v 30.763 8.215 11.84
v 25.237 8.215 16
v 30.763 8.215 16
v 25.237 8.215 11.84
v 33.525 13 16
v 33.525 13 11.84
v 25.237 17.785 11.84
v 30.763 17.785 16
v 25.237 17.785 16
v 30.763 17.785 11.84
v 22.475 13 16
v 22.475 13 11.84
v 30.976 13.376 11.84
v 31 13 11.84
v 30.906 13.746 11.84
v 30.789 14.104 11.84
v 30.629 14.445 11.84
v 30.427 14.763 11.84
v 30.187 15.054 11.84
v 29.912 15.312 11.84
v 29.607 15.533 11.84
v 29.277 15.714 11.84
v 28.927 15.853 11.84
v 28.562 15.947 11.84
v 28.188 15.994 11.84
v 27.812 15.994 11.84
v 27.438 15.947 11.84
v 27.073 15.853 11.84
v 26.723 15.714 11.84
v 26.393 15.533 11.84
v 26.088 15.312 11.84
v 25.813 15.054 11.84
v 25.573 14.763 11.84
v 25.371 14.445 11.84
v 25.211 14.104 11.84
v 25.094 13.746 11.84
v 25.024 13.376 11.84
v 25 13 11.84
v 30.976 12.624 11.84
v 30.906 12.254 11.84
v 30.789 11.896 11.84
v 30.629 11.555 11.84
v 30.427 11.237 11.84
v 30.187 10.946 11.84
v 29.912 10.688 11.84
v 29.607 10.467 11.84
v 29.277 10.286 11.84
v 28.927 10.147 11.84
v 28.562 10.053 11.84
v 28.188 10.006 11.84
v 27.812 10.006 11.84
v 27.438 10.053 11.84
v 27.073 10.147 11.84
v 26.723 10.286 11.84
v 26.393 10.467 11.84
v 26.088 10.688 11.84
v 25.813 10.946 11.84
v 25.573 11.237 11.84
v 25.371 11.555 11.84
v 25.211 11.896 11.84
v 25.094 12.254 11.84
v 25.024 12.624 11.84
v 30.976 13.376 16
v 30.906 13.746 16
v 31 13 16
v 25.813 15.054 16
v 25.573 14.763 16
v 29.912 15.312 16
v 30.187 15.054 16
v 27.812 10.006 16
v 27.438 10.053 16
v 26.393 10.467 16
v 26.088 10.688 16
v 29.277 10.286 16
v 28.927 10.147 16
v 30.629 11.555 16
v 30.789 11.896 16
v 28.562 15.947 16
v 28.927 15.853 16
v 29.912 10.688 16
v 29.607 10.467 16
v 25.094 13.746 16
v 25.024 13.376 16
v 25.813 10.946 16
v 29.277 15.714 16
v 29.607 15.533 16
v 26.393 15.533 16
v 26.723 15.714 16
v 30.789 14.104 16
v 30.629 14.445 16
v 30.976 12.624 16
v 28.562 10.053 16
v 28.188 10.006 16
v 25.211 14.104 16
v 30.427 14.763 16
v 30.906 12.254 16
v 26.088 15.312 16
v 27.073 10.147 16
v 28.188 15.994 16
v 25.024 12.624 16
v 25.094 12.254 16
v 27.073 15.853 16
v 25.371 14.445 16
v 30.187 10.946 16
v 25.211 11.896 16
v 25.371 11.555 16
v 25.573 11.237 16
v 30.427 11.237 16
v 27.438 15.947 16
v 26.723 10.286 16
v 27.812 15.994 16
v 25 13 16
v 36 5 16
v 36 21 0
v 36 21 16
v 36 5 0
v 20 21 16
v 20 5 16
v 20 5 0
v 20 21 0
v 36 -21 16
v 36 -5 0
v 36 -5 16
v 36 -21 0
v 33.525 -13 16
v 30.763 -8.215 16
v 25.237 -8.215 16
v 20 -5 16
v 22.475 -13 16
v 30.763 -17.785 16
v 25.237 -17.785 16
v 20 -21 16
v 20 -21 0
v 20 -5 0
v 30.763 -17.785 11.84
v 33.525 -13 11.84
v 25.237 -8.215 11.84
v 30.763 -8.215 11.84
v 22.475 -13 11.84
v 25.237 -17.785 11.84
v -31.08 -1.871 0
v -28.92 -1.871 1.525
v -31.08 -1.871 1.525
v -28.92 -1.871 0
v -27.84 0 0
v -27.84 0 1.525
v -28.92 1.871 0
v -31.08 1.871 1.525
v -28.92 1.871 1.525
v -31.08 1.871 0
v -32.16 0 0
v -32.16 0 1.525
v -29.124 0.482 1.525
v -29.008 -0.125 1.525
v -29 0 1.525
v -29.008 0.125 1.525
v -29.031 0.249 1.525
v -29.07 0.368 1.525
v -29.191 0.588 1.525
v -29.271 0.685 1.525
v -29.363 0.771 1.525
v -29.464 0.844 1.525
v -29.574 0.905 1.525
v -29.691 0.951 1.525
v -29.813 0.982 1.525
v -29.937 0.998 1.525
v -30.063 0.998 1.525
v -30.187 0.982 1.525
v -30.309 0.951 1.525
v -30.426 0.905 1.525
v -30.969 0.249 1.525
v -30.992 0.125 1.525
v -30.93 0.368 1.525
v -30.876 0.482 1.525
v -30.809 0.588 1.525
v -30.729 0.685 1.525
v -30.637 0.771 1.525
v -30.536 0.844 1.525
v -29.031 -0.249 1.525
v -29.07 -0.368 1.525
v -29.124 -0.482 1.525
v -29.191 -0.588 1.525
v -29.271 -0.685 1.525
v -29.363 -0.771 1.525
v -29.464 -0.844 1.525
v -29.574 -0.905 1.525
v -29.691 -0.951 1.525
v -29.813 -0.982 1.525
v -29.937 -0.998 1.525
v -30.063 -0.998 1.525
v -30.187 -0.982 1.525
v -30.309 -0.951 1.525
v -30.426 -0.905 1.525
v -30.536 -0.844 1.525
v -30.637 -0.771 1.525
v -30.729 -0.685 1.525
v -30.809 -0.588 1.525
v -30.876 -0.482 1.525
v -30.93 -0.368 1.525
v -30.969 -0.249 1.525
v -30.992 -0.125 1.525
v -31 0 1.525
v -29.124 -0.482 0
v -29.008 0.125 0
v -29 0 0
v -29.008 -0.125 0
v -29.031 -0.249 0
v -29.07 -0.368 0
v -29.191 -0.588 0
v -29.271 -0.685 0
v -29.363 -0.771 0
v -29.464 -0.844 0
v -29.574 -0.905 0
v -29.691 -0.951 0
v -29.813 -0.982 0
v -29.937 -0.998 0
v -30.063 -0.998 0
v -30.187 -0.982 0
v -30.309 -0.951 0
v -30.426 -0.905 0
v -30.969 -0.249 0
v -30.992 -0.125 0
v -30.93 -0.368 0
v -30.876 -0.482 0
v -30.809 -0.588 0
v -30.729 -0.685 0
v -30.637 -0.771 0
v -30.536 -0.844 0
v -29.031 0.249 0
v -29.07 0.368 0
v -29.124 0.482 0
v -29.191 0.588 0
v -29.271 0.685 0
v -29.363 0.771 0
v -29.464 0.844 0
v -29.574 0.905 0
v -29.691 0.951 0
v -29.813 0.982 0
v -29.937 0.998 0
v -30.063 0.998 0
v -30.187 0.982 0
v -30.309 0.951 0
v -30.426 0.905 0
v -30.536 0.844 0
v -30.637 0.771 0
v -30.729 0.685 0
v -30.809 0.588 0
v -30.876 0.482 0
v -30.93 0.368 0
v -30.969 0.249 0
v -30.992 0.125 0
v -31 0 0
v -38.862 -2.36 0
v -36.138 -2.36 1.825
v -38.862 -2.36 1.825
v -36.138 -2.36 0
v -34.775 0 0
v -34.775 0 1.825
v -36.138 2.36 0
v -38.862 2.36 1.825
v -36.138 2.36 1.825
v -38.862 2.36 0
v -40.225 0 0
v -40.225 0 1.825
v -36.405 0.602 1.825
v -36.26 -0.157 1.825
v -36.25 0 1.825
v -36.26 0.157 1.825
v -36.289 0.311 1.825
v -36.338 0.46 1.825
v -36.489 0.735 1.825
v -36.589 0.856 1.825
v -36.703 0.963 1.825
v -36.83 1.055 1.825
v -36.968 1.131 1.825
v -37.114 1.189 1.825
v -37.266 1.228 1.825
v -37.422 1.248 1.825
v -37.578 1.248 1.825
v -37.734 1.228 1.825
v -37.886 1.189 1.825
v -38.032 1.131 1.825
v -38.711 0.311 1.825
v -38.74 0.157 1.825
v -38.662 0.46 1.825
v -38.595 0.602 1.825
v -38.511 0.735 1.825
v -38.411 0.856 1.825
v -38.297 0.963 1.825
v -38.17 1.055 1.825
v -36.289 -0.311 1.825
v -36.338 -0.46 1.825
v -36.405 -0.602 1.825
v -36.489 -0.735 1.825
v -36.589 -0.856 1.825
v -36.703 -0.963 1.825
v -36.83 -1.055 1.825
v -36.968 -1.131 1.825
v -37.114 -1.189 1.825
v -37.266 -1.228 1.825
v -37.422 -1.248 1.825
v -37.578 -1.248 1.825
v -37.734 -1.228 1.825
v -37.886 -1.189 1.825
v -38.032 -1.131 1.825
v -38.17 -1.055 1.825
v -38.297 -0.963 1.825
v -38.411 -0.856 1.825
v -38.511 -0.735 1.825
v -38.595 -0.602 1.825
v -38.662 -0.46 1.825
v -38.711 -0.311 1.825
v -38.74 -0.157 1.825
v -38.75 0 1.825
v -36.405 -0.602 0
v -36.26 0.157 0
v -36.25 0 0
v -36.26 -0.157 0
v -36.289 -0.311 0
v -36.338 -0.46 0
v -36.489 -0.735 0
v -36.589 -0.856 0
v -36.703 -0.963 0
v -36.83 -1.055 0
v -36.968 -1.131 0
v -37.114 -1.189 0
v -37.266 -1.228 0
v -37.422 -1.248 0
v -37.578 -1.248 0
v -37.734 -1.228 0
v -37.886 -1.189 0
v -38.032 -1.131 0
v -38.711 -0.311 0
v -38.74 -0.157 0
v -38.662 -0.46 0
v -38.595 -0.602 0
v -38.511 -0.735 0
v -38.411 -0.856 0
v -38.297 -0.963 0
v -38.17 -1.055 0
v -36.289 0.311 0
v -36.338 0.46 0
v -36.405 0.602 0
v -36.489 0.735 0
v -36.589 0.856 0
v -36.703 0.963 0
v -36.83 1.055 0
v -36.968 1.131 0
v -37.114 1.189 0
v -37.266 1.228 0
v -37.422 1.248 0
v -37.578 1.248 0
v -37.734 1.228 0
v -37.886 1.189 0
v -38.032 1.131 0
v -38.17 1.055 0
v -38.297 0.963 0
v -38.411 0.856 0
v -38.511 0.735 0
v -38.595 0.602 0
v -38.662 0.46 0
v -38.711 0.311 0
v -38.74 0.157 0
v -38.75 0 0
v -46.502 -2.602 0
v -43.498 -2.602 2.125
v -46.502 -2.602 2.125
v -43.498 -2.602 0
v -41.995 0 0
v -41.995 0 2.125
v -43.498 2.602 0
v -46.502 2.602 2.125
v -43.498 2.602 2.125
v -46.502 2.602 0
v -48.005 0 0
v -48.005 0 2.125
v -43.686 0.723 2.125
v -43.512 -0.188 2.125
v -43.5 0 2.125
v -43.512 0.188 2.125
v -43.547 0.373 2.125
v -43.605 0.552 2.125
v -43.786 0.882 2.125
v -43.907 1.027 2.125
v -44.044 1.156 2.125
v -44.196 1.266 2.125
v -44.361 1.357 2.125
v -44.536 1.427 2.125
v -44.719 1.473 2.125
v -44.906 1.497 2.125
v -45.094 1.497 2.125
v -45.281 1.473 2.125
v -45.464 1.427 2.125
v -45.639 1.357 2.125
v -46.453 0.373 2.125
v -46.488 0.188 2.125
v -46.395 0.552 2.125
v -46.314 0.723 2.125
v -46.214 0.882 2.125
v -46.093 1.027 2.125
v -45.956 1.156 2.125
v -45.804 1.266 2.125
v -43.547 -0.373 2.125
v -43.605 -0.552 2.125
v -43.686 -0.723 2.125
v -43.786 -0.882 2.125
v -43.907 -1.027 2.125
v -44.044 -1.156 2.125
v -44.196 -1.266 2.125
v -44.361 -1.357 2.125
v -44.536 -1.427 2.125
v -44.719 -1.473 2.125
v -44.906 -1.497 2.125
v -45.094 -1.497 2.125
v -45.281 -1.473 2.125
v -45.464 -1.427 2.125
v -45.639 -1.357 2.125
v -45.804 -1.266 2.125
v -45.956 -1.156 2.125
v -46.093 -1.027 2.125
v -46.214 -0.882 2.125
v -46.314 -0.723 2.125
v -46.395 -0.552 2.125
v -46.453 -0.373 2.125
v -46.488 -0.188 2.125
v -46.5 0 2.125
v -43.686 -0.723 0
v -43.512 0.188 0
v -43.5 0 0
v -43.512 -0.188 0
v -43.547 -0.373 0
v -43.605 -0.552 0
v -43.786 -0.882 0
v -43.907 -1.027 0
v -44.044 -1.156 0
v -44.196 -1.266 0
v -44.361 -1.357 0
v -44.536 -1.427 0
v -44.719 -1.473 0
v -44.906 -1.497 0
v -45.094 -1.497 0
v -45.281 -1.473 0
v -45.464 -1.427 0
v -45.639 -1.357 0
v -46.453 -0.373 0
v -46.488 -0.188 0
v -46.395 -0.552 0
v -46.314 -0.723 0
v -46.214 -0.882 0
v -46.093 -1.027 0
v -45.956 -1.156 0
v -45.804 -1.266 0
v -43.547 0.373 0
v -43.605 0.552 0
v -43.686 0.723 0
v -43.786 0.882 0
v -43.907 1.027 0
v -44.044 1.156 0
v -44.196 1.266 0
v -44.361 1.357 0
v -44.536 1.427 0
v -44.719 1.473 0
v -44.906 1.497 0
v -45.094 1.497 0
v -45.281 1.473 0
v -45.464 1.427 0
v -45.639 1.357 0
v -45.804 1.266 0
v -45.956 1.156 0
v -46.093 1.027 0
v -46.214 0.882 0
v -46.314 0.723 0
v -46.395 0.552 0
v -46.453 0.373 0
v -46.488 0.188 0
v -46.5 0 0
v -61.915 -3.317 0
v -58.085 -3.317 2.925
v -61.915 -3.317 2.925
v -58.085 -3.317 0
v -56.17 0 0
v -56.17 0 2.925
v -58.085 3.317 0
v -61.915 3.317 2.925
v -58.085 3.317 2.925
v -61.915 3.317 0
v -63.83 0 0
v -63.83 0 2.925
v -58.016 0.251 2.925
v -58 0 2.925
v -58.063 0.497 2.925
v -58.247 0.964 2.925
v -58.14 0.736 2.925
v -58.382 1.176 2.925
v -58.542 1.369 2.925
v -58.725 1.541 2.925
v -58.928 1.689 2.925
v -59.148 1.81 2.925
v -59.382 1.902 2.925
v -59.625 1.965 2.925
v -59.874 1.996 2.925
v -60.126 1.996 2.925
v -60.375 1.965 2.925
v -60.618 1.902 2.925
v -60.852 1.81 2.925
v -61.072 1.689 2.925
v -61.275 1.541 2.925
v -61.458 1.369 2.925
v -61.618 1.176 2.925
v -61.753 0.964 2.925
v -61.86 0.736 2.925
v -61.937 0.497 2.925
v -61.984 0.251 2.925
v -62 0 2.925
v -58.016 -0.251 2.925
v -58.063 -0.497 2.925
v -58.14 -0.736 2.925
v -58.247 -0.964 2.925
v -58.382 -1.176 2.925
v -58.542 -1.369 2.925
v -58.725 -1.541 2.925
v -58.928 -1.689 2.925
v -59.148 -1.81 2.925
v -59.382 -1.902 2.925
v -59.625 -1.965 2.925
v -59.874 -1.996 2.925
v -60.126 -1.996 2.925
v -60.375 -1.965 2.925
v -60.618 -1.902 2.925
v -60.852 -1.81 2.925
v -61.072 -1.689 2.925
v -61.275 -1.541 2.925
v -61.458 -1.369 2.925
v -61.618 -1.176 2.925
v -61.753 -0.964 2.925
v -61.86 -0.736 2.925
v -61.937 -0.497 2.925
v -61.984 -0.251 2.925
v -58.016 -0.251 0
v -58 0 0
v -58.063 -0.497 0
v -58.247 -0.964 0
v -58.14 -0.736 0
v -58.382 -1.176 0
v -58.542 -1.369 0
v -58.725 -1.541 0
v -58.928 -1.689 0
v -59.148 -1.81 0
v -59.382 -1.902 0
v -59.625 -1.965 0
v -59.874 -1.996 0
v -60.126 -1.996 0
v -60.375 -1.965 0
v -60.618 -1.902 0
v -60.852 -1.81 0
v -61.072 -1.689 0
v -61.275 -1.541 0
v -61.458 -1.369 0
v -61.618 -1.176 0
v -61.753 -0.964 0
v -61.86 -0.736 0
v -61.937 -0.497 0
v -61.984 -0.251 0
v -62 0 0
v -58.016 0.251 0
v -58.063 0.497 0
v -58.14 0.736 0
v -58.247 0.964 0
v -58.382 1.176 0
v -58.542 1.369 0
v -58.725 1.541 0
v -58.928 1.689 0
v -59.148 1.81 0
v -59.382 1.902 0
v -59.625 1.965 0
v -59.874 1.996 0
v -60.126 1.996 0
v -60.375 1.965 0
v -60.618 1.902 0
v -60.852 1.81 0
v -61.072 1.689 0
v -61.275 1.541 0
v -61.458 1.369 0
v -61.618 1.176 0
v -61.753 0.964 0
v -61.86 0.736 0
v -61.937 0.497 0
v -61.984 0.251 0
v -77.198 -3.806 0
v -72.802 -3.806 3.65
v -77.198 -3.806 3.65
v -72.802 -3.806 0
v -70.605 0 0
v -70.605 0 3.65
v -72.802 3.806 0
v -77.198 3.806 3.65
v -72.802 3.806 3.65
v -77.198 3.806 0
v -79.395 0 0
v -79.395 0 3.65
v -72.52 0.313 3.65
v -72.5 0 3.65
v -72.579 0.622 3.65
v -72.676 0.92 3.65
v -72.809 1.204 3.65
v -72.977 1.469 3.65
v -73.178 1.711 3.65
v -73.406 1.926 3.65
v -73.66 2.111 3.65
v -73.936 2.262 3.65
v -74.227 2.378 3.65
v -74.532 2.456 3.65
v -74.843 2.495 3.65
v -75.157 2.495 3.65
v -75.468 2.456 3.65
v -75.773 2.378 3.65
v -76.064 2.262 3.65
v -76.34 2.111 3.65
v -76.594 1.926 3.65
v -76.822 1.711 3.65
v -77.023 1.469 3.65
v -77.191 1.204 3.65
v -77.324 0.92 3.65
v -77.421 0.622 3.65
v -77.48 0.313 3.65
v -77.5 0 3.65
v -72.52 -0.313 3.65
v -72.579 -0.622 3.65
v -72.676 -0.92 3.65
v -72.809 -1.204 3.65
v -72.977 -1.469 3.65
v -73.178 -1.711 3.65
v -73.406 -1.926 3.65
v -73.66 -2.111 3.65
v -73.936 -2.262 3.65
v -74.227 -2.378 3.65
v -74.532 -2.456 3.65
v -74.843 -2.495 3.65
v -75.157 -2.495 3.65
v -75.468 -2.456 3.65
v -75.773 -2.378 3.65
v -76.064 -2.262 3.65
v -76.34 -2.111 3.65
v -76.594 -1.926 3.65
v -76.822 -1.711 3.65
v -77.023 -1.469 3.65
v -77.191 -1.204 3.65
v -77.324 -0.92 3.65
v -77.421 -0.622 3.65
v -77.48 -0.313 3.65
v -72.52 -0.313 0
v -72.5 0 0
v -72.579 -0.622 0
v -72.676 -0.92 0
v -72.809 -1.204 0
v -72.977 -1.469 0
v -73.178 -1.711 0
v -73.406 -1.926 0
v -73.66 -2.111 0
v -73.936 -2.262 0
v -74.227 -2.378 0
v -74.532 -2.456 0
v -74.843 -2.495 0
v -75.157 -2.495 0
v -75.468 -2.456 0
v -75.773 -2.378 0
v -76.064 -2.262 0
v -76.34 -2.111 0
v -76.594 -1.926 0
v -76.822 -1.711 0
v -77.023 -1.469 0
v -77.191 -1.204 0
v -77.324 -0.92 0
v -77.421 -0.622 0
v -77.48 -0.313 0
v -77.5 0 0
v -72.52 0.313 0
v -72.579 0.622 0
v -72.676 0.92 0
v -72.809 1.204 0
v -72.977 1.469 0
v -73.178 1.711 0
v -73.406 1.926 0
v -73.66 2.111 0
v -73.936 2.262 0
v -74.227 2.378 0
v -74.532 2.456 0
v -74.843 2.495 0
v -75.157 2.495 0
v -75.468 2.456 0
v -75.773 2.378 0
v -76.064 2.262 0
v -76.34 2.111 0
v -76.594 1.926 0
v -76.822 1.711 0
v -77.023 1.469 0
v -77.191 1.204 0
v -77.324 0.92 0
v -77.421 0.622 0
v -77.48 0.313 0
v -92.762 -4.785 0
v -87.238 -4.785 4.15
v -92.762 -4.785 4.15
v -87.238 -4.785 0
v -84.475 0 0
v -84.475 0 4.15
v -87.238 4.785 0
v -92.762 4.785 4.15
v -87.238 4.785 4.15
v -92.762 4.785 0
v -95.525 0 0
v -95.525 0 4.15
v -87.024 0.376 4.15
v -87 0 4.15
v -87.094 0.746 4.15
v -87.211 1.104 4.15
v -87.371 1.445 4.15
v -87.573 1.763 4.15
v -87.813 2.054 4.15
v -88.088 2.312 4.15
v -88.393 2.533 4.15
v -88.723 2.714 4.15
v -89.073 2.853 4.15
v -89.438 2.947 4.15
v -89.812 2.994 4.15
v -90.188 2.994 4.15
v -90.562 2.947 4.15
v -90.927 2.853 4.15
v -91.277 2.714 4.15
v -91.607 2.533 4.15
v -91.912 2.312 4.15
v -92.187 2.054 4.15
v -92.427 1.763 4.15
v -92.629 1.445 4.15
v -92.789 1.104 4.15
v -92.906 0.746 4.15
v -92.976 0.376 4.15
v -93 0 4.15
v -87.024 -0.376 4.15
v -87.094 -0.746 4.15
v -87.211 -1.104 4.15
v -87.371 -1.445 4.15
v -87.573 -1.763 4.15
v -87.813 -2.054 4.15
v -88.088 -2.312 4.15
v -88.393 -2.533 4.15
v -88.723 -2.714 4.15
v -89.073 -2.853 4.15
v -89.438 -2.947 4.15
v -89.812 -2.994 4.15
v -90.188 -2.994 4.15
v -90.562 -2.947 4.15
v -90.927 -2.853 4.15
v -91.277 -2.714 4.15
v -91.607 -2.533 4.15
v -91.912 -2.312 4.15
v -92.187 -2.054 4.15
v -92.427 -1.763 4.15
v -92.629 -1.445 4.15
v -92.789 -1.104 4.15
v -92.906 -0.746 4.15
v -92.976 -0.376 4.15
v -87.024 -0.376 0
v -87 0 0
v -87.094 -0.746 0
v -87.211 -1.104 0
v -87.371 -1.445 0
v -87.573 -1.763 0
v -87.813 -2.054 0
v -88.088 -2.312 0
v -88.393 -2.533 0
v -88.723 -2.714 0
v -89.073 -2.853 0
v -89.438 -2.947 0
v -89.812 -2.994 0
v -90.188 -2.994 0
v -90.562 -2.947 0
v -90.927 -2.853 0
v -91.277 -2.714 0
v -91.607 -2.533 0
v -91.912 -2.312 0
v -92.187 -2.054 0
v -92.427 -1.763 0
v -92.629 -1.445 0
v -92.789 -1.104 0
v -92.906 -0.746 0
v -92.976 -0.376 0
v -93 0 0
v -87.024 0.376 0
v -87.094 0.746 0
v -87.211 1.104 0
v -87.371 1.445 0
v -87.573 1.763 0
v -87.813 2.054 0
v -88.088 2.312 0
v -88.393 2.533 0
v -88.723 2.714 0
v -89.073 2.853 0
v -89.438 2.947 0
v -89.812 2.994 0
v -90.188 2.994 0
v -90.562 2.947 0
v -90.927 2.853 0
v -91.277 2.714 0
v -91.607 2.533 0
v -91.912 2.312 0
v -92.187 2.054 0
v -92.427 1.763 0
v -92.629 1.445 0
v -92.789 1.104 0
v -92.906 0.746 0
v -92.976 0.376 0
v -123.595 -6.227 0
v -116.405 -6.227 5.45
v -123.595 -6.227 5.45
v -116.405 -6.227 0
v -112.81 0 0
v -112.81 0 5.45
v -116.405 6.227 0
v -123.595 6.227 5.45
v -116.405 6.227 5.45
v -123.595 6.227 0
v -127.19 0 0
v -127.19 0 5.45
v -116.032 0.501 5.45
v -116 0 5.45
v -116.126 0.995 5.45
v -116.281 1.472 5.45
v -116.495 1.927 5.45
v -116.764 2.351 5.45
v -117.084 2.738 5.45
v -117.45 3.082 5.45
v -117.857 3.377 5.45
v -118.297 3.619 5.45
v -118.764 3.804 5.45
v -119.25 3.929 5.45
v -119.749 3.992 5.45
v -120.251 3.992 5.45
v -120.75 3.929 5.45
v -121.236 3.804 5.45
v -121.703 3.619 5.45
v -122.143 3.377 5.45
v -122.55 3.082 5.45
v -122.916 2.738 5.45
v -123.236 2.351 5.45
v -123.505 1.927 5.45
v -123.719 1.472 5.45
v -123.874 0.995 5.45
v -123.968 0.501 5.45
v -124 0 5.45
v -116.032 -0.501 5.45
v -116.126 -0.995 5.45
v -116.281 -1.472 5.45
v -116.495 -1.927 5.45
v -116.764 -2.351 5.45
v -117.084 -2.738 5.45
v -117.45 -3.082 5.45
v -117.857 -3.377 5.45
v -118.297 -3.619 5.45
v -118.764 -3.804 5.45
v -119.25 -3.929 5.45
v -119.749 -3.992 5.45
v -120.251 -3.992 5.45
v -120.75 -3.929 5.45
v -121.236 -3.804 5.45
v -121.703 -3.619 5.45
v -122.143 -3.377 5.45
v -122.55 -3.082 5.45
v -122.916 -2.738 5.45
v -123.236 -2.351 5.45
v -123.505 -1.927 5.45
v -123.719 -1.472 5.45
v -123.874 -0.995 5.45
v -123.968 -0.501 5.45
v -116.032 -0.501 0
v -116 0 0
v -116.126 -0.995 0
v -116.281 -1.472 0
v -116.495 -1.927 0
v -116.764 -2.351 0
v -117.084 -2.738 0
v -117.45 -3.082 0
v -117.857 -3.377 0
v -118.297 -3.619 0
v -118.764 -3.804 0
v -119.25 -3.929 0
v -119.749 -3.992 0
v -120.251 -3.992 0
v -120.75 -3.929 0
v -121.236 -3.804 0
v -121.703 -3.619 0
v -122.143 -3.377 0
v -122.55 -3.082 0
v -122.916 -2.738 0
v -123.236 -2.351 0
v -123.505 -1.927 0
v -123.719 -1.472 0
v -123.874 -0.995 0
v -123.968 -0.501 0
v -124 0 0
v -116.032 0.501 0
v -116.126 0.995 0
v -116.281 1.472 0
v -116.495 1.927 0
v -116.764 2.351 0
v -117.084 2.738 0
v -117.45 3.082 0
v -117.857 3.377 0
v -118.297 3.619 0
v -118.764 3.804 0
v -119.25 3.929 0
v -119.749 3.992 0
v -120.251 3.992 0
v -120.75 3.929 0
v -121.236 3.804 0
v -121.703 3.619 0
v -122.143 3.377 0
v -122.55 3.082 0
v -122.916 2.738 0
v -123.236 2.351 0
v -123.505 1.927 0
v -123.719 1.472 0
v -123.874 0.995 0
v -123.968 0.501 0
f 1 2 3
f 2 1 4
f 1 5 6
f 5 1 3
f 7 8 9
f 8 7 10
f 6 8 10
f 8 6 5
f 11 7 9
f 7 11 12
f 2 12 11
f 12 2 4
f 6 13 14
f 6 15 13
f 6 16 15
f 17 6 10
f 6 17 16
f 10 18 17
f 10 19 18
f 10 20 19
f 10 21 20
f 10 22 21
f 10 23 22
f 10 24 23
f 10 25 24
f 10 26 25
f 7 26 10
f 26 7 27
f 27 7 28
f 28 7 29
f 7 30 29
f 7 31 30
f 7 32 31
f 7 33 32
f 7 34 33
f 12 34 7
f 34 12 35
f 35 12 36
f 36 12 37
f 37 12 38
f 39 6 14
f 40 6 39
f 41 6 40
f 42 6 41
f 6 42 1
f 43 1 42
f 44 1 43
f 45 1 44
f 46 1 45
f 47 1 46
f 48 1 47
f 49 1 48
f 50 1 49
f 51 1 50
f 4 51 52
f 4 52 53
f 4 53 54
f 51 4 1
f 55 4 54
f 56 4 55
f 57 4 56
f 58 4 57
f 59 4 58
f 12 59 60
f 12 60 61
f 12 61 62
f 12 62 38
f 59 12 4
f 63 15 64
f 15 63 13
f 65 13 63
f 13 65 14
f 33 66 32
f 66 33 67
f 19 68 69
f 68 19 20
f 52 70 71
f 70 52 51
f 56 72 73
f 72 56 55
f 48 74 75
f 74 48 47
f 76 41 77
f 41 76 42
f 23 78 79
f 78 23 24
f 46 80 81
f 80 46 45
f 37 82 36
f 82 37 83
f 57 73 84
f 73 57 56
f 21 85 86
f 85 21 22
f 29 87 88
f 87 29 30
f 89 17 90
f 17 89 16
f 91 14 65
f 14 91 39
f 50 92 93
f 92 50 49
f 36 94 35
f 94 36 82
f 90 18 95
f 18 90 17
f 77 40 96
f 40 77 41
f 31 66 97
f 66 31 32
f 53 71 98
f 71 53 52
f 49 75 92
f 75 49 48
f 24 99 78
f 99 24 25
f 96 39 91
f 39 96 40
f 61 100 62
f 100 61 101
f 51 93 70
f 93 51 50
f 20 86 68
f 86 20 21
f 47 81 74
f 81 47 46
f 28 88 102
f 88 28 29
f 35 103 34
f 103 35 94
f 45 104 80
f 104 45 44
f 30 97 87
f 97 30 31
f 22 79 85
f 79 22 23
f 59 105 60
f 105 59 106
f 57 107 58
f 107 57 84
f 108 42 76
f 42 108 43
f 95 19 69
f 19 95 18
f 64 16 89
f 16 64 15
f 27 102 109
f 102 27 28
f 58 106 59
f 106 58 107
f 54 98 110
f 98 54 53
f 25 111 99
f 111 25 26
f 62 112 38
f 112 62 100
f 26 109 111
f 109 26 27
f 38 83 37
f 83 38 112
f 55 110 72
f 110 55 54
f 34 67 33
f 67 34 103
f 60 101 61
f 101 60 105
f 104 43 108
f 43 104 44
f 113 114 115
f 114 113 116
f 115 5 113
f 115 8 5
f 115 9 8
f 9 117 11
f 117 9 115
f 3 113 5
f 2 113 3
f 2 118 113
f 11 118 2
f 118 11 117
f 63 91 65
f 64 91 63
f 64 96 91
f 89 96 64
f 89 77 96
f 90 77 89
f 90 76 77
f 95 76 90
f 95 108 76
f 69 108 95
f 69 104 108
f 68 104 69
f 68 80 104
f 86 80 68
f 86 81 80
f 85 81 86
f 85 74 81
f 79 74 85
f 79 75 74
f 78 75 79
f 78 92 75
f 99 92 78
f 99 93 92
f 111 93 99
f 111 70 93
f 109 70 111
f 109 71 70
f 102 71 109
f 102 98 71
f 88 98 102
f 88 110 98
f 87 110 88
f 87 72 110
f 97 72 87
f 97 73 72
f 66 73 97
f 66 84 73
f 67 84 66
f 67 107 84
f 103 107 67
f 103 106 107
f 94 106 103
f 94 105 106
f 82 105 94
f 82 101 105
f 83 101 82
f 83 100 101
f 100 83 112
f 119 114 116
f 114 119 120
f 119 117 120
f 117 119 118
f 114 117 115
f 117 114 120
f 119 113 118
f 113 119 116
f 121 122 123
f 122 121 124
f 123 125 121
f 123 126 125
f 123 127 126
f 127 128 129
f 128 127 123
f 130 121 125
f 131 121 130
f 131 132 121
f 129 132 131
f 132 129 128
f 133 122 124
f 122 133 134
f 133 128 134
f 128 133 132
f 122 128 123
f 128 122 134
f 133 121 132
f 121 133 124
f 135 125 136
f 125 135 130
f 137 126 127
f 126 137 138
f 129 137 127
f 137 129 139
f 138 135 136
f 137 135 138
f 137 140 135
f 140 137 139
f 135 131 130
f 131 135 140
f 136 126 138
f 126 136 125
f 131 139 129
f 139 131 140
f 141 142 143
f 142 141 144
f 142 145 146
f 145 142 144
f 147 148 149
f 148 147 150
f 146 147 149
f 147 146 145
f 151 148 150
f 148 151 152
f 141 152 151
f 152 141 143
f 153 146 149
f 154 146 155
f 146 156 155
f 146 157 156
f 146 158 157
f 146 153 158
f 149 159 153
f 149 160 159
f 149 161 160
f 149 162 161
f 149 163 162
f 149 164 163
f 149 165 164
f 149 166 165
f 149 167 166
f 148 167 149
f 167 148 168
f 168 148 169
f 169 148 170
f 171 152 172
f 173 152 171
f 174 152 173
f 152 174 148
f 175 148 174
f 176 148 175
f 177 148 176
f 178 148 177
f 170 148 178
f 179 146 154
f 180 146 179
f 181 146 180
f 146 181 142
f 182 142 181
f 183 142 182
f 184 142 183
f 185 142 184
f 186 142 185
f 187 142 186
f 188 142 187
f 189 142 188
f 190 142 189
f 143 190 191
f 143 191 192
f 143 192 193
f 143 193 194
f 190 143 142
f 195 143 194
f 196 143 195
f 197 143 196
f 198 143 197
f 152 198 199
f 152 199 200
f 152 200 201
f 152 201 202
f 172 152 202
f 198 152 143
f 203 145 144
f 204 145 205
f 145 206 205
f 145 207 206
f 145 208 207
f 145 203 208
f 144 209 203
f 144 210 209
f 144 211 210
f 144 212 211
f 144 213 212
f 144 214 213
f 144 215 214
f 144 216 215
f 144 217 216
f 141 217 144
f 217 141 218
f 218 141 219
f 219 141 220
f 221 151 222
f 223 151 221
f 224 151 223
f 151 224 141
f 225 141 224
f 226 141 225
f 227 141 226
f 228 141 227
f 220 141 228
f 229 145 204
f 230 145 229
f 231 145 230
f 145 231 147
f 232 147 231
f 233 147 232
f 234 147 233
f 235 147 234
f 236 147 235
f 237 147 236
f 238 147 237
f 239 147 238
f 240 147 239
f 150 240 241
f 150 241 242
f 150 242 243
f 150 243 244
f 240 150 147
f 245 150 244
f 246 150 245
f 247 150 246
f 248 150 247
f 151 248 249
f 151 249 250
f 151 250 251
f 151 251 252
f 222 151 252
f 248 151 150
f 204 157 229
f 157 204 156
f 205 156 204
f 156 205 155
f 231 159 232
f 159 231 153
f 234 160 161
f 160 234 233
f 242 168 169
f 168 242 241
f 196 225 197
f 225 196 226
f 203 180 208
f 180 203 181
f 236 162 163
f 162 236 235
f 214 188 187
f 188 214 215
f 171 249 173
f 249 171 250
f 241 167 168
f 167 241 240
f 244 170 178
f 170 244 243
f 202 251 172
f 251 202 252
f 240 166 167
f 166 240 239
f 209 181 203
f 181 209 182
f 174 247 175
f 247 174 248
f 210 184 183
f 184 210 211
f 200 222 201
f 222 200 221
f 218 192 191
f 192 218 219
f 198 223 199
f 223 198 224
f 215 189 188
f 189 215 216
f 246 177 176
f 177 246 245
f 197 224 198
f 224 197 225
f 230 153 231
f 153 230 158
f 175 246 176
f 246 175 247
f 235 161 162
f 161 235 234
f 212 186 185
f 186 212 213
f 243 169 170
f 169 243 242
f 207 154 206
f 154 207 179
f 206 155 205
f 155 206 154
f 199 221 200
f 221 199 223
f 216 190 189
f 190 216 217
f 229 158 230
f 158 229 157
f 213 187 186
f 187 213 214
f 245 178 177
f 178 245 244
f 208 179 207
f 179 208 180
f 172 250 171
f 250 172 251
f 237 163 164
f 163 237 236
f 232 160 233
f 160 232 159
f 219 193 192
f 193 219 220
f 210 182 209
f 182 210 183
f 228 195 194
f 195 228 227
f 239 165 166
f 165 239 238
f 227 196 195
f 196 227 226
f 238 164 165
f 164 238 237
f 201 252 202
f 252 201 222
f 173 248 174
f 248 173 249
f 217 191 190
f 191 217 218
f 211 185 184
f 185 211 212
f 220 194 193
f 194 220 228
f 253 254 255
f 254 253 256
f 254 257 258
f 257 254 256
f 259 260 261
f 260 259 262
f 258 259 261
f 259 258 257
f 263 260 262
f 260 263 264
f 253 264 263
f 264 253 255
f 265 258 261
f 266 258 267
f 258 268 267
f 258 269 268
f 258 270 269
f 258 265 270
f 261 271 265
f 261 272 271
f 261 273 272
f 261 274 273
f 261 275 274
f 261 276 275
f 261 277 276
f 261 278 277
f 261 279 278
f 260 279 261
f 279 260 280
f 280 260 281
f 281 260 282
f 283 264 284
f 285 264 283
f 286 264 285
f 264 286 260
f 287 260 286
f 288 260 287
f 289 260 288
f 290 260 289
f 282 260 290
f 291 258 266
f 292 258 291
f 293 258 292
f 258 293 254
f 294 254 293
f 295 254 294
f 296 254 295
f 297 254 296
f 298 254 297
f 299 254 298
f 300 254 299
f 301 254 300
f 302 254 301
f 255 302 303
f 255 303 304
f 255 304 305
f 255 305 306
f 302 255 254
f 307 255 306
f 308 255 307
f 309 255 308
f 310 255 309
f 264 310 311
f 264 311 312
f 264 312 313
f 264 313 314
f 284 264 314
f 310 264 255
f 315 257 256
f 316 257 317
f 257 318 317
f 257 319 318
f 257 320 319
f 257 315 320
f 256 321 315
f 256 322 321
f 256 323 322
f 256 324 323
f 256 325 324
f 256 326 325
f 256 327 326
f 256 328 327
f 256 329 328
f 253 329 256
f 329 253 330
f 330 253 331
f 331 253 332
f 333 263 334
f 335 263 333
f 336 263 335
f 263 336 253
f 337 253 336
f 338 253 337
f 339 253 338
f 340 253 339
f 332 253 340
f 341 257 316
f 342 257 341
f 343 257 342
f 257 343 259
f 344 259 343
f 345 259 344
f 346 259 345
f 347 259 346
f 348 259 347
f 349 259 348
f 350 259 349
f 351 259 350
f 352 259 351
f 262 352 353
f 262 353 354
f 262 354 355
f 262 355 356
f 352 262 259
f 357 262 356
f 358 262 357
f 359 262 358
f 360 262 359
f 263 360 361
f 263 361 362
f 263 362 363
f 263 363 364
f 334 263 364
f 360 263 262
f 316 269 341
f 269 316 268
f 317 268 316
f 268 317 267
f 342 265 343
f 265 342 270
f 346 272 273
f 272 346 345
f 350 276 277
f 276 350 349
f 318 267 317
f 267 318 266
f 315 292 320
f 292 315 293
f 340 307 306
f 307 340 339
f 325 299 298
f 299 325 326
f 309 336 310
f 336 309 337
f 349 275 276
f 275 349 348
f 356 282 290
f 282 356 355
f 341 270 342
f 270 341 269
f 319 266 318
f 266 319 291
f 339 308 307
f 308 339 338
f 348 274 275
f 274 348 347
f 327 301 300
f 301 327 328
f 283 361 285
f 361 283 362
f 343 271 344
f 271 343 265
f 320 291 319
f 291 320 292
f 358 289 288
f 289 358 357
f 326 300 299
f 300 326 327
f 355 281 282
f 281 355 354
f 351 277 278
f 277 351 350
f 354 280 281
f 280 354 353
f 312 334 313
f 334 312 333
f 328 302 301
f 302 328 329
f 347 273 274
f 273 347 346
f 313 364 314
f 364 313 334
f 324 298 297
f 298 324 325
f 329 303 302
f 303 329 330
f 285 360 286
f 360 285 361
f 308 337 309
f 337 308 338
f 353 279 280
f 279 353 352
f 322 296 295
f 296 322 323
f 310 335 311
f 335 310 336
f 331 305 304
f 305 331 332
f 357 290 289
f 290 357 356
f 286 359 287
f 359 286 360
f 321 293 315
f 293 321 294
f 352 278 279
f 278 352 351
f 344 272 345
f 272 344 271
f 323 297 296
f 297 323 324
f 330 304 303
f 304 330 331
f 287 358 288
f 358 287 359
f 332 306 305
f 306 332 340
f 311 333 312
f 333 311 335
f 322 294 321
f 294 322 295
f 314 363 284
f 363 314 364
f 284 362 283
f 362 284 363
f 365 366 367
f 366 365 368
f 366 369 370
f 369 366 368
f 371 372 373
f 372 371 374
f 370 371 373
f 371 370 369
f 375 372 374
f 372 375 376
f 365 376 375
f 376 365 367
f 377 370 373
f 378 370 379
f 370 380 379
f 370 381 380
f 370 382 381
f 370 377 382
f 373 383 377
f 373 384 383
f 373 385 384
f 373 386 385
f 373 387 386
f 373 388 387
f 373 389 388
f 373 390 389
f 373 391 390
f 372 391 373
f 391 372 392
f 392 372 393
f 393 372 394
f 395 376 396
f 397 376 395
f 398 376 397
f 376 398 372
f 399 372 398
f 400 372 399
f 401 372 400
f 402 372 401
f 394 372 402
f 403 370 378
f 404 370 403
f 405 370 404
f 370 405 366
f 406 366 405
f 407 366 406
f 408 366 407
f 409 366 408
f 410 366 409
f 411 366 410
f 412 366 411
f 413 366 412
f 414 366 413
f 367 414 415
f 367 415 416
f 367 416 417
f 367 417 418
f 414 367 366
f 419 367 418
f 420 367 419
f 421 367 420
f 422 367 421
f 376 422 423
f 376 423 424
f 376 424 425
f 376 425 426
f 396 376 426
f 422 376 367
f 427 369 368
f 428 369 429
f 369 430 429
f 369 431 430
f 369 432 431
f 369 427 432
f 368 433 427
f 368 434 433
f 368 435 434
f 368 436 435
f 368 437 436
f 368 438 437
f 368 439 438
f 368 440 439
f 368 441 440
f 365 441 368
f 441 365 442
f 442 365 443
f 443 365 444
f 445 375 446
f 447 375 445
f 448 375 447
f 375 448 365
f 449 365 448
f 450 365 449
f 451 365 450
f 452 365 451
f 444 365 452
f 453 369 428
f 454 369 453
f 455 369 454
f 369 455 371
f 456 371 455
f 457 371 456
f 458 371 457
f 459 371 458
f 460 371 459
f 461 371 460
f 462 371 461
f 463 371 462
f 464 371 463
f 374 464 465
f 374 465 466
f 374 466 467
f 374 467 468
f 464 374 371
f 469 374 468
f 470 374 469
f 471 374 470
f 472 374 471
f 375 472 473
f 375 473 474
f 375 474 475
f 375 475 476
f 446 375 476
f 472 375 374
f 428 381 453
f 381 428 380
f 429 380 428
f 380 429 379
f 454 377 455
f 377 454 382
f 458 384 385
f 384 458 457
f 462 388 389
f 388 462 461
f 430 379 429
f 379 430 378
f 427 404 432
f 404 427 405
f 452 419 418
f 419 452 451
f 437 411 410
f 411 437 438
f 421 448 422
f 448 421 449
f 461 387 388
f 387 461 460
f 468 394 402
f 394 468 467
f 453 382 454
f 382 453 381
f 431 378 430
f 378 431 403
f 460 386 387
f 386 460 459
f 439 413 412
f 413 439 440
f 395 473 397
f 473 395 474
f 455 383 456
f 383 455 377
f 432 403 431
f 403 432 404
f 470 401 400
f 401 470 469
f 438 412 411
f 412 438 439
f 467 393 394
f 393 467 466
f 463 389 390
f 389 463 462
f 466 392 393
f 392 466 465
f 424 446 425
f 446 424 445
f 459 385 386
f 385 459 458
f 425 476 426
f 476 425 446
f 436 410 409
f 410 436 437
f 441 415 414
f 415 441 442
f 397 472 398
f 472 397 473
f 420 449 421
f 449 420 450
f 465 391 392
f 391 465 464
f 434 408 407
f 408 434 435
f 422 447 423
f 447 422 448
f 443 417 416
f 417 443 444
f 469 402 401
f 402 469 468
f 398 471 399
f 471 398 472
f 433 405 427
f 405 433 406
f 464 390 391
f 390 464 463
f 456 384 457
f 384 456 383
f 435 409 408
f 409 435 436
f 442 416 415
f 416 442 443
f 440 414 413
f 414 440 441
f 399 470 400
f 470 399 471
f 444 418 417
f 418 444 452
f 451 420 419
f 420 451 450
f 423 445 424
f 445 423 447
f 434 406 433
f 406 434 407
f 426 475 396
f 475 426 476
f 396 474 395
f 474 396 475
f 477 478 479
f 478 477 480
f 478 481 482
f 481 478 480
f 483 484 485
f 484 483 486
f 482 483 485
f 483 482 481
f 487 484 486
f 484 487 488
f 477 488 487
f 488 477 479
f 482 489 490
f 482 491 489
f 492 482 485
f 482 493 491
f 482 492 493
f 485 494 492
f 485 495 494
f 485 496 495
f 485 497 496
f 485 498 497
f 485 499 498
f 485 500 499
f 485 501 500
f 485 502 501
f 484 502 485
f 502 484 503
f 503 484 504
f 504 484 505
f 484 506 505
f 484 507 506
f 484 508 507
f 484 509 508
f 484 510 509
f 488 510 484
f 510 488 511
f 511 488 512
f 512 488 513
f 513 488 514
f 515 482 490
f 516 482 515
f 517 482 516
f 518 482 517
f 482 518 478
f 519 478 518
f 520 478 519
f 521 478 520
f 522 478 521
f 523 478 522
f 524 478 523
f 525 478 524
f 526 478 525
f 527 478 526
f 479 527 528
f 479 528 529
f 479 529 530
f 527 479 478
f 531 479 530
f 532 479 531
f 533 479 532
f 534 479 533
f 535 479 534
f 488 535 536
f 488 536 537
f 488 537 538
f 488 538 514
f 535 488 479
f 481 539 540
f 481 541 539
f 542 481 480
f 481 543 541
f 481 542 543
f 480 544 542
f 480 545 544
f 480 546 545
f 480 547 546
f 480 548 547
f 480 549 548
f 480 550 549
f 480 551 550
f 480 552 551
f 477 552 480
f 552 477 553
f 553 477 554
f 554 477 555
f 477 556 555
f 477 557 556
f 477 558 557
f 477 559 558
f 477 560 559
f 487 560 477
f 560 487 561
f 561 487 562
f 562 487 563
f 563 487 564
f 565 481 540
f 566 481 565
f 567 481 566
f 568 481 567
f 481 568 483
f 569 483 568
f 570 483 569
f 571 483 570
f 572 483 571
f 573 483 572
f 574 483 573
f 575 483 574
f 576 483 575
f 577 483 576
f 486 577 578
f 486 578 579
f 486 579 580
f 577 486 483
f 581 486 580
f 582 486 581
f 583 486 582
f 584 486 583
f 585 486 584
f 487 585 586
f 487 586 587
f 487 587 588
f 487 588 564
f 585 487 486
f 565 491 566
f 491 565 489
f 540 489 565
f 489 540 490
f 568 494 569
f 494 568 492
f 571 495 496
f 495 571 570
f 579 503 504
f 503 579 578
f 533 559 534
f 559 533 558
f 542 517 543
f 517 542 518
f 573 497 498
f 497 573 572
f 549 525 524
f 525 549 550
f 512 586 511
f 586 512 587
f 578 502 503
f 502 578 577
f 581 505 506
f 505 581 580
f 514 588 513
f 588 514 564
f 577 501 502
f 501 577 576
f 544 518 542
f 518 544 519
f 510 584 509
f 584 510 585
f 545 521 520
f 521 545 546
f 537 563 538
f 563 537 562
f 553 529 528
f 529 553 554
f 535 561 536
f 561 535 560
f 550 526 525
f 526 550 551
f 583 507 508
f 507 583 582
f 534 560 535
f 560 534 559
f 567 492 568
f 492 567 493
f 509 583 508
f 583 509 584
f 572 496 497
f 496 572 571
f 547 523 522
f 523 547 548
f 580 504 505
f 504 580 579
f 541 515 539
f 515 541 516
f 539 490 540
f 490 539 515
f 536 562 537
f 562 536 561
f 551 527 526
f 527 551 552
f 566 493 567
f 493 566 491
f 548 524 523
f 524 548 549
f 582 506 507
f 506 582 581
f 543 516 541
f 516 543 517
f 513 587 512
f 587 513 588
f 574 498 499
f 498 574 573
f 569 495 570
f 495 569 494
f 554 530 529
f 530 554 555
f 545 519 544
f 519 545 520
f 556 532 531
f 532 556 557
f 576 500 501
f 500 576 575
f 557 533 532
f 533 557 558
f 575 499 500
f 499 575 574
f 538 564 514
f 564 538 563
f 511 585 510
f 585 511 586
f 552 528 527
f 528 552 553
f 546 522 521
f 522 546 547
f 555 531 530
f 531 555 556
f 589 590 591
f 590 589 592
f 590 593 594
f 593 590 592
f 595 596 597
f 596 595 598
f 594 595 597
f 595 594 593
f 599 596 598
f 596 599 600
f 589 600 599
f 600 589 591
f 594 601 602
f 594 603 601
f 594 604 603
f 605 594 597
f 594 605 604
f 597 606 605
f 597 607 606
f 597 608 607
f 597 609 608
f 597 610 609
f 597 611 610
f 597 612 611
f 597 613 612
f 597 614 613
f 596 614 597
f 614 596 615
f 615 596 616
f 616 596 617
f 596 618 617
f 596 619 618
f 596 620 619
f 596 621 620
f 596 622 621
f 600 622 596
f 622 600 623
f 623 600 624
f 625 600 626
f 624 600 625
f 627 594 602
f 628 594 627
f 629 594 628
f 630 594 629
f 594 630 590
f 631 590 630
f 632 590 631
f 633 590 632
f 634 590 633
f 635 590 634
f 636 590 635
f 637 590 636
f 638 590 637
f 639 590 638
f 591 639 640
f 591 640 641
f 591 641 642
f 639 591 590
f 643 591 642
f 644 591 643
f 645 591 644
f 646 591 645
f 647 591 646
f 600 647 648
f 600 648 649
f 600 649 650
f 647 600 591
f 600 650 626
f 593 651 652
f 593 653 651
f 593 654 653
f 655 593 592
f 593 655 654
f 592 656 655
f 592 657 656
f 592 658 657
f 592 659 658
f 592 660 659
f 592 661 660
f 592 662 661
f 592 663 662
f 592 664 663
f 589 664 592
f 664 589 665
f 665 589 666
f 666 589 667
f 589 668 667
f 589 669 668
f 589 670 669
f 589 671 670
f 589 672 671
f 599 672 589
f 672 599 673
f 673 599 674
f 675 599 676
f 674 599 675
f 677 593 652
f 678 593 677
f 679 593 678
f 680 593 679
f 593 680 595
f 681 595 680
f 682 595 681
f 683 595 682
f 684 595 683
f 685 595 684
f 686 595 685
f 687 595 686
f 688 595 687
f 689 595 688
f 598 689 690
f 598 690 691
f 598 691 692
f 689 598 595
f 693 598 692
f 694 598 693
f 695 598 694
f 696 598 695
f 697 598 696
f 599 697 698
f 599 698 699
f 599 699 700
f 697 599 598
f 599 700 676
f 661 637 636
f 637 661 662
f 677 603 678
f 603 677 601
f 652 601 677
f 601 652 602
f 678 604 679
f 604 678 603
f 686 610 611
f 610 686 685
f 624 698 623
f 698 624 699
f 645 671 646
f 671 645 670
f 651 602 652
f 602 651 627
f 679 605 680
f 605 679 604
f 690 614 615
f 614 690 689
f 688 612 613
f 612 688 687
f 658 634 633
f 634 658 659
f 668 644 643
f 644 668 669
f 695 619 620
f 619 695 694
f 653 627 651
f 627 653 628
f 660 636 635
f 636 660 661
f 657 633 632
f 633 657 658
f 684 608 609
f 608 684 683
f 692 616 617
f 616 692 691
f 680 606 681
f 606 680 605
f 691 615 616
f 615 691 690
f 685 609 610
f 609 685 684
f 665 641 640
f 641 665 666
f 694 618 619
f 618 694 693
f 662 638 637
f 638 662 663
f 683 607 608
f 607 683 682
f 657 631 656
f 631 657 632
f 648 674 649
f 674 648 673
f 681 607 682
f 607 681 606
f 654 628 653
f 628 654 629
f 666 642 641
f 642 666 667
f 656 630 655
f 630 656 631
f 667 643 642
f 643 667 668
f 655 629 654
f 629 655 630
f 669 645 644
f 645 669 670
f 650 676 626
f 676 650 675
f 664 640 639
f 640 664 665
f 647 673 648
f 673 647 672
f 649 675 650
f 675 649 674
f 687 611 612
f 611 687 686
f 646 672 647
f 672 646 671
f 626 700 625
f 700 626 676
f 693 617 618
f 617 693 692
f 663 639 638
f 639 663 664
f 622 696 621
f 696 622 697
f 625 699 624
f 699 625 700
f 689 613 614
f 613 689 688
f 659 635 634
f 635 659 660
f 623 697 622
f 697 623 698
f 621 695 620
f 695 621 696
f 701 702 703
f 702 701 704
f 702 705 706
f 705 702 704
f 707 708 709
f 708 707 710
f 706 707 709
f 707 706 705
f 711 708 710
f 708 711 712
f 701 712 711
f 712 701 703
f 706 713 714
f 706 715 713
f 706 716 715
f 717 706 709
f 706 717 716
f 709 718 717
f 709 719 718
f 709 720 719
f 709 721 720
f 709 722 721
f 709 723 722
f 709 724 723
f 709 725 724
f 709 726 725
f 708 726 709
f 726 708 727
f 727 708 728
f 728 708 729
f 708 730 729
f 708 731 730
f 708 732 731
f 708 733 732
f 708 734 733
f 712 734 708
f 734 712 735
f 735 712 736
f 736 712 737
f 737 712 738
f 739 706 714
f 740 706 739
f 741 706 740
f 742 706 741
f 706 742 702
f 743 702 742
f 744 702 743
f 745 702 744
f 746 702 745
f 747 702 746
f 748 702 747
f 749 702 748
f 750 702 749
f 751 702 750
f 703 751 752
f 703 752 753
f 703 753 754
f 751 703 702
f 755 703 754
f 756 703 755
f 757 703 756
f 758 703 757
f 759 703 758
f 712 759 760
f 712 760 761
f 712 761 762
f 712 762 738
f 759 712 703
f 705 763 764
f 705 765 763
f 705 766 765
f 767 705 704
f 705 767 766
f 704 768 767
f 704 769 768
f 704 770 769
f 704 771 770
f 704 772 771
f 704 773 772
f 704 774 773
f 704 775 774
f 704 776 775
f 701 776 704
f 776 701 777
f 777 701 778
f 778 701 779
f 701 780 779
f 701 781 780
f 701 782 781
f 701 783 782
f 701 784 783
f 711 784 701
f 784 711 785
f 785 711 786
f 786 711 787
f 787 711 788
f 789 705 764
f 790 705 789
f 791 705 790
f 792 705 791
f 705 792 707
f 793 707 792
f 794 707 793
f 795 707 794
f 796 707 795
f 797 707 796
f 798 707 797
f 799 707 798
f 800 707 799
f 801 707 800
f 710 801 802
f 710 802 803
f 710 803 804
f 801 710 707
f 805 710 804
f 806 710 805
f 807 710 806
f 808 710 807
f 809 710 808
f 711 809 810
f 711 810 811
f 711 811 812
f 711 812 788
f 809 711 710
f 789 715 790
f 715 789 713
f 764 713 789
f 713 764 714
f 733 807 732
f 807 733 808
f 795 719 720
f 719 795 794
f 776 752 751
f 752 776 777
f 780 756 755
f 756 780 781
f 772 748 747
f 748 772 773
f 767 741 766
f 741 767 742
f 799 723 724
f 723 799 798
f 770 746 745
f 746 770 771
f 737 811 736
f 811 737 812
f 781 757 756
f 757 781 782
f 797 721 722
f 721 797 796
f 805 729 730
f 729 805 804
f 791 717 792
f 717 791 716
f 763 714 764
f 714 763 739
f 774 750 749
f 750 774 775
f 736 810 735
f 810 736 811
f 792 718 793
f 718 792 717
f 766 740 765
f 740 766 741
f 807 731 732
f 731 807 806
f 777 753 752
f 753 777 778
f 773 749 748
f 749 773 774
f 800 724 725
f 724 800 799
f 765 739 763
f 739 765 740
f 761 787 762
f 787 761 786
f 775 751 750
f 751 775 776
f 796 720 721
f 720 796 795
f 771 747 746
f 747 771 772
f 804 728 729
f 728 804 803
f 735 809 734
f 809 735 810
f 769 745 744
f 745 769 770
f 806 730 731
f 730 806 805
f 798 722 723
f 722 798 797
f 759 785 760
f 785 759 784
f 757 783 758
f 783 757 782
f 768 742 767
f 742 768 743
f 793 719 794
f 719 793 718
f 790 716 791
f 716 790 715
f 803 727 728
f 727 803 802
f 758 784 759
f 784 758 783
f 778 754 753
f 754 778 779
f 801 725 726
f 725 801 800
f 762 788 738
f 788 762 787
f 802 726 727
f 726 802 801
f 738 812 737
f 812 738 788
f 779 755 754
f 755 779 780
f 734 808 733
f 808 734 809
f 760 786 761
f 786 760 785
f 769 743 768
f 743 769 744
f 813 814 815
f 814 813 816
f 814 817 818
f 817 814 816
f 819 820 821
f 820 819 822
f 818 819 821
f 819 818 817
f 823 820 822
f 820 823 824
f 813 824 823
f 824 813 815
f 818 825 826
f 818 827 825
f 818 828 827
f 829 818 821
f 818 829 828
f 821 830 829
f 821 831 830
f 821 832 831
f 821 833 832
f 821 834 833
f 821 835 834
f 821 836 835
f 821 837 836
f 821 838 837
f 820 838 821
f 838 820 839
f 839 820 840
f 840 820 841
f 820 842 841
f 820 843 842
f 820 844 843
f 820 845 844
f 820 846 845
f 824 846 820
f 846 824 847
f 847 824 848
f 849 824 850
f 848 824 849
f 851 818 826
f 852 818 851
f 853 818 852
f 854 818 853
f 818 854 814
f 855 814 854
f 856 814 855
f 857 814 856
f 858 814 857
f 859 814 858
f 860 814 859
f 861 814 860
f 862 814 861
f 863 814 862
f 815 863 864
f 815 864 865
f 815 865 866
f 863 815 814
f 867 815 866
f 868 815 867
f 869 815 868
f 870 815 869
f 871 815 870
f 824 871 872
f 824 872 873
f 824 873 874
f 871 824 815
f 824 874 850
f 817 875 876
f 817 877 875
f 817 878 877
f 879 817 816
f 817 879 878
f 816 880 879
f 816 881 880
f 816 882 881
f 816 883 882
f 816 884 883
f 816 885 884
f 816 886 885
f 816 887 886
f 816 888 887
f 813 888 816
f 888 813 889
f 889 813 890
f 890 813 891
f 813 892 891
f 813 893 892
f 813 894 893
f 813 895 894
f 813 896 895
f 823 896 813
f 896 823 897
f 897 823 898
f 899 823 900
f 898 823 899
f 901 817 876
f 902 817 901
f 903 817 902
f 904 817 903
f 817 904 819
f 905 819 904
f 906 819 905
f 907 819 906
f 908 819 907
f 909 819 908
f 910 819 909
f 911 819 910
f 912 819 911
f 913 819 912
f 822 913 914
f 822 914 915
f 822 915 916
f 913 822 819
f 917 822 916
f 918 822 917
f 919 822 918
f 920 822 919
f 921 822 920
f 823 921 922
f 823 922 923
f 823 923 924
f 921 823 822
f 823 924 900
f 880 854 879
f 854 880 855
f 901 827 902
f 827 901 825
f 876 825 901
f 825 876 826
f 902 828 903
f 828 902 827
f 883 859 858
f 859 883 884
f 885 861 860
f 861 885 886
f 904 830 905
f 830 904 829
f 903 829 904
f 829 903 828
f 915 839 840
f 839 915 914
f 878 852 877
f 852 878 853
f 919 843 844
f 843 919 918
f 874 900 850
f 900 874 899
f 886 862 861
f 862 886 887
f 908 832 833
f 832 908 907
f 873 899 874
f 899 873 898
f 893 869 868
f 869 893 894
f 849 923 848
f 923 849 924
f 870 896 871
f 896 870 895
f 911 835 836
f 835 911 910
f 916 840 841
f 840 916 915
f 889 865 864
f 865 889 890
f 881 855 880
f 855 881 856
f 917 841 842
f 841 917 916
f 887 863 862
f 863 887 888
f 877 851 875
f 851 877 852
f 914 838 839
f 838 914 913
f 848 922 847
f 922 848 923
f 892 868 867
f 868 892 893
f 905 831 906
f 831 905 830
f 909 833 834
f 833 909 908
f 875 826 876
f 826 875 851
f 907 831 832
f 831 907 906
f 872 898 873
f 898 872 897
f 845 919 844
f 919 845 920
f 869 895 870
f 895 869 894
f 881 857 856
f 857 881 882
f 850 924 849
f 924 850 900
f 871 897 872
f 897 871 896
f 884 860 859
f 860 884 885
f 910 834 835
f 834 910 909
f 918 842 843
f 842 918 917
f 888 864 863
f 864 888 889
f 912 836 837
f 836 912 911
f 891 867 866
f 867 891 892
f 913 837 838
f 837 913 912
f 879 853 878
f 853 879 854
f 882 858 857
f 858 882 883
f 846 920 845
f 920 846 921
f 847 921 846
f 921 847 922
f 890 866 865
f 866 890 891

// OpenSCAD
/**
 * @author OlivierLD
 *
 * Screws, bolts, nuts, washer, ball bearings, etc...
 * To be used as placeholders.
 *
 * Screws specs: 
 * - metric countersunk: https://us.misumi-ec.com/vona2/detail/221005020316/
 * - metric hex bolts: http://stsindustrial.com/a2-hex-cap-screw-technical-data/
 * - metric washers: https://www.mutualscrew.com/department/metric-flat-washers-din-125-11622.cfm
 *
 * Includes at the bottom many tests and showcases.
 */


// Countresunk. [dk, k] dk: head diameter, k head thickness.
M3_CS = [6.72, 1.86];
M4_CS = [8.96, 2.48];
M5_CS = [11.20, 3.1];
M6_CS = [13.44, 3.72];
M8_CS = [17.92, 4.96];

// Hex Nuts and Bolts [h, f, g]. h: Head thickness, f: head spanner size (ex: M6, f: 10, g: 11.05)
// Use g for an hexa head in OpenSCAD
M2_HB = [1.525, 4, 4.32];
M25_HB = [1.825, 5, 5.45];
M3_HB = [2.125, 5.5, 6.01];
M4_HB = [2.925, 7, 7.66];
M5_HB = [3.65, 8, 8.79];
M6_HB = [4.15, 10, 11.05];
M8_HB = [5.45, 13, 14.38];

// Washer, [OD, thickness]
M3_W = [7, 0.55];
M35_W = [8, 0.55];
M4_W = [9, 0.9];
M5_W = [10, 1.1];
M6_W = [12, 1.8];
M8_W = [16, 1.8];

// Ball Bearings [ID, OD, Thickness]
// Warning: do check the data sheet of your ball bearing! Dimensions may vary!
BB_05 = [5, 16, 5];
BB_06 = [6, 19, 6];
BB_08 = [8, 22, 7];

function getBBDims(diam) =  // Ball bearings dims
  (diam == 5) ? BB_05 :
  (diam == 6) ? BB_06 :
	[0, 0];

function getCSScrewDims(diam) = // Countersunk dims
	(diam == 3) ? M3_CS :
	(diam == 4) ? M4_CS :
	(diam == 5) ? M5_CS :
	(diam == 6) ? M6_CS :
	(diam == 8) ? M8_CS :
  [0, 0];

function getHBScrewDims(diam) =  // Hex Bolts and Nuts dims
	(diam == 2) ? M2_HB :
	(diam == 2.5) ? M25_HB :
	(diam == 3) ? M3_HB :
	(diam == 4) ? M4_HB :
	(diam == 5) ? M5_HB :
	(diam == 6) ? M6_HB :
	(diam == 8) ? M8_HB :
  [0, 0];

function getWasherDims(diam) =  // Washer dims
	(diam == 3) ? M3_W :
	(diam == 3.5) ? M35_W :
	(diam == 4) ? M4_W :
	(diam == 5) ? M5_W :
	(diam == 6) ? M6_W :
	(diam == 8) ? M8_W :
  [0, 0];

module ballBearing(id) {
	dims = getBBDims(id); // [id, od, t]
	difference() {
		color("grey", 0.85) {
			cylinder(h=dims[2], d=dims[1], $fn=100, center=true); 
		}
		cylinder(h=dims[2] * 1.1, d=dims[0], $fn=100, center=true); 
	}
}

/**
 * A countersunk metal screw 
 * Can be used for the screw itself, or the hole it needs.
 * diameter can be one of 3, 4, 5, 6, or 8
 * Use a top greater than 0 for difference().
 */
module metalScrewCS(diam, length, top=0) {
	//echo (str("Diam:", diam, "mm"));
	dims = getCSScrewDims(diam);
	dk = dims[0];
	k = dims[1];
	//echo (str("Diam:", diam, "mm, k:", k, ", dk:", dk));
	union() {
		if (top > 0) {
			translate([0, 0, length - 0.01]) {
				cylinder(h=top + 0.01, d=dk, $fn=50);
			}
		}
		translate([0, 0, length - k]) {
			cylinder(h=k, d1=diam, d2=dk, center=false, $fn=50);
		}
		translate([0, 0, 0.1]) {
			cylinder(h=length - k + 0.1, d=diam, $fn=50);
		}
	}
}

/**
 * A hex bolt metal screw 
 * Can be used for the screw itself, or the hole it needs.
 * diameter can be one of 2, 2.5, 3, 4, 5, 6, or 8
 * Use a top greater than 0 for difference().
 */
module metalScrewHB(diam, length, top=0) {
	//echo (str("Diam:", diam, "mm"));
	dims = getHBScrewDims(diam);
	h = dims[0];
	s = dims[2]; // Was 1

	union() {
		if (top > 0) {
			translate([0, 0, length - 0.01]) {
				cylinder(h=top + 0.01, d=s, $fn=6); // 6 faces
			}
		}
		translate([0, 0, length]) {
			cylinder(h=h, d=s, center=false, $fn=6); // 6 faces
		}
		translate([0, 0, 0.1]) {
			cylinder(h=length + 0.1, d=diam, $fn=50);
		}
	}
}

/**
 * A hex nut
 * Can be used for the nut itself, or the hole it needs.
 * diameter can be one of 2, 2.5, 3, 4, 5, 6, or 8
 * Use a top greater than 0 for difference().
 */
module hexNut(diam, top=0) {
	//echo (str("Diam:", diam, "mm"));
	dims = getHBScrewDims(diam);
	h = dims[0];
	s = dims[2]; // Was 1

	length = 0;
	
	difference() {
		union() {
			if (top > 0) {
				translate([0, 0, length - 0.01]) {
					cylinder(h=top + 0.01, d=s, $fn=6); // 6 faces
				}
			}
			translate([0, 0, length]) {
				cylinder(h=h, d=s, center=false, $fn=6); // 6 faces
			}
		}
		translate([0, 0, -2]) {
			cylinder(h=h + 4, d=diam, $fn=50);
		}
	}
}

/**
 * A washer
 * Can be used for the washer itself, or the hole it needs.
 * diameter can be one of 2, 2.5, 3, 4, 5, 6, or 8
 * Use a top greater than 0 for difference().
 */
module washer(diam, top=0) {
	//echo (str("Diam:", diam, "mm"));
	dims = getWasherDims(diam);
	od = dims[0];
	t = dims[1];

	length = 0;
	
	difference() {
		union() {
			if (top > 0) {
				translate([0, 0, length - 0.01]) {
					cylinder(h=t + 0.01, d=od, $fn=50); 
				}
			}
			translate([0, 0, length]) {
				cylinder(h=t, d=od, center=false, $fn=50);
			}
		}
		translate([0, 0, -2]) {
			cylinder(h=t + 4, d=diam, $fn=50);
		}
	}
}

// Tests
echo("For tests only");

if (false) { // CS Screw test
	screwDiam = 5;
	screwLen = 30;

	translate([-20, 0, 0]) {
		metalScrewCS(screwDiam, screwLen);
	}
	translate([20, 0, 0]) {
		difference() {
			cube(16);
			translate([8, 8, -20]) { // Try #translate ;)
				metalScrewCS(screwDiam, screwLen, 10);
			}
		}
	}
	
	for (i=[3, 4, 5, 6, 8]) {
		translate([-15 * i, 0, 0]) {
			metalScrewCS(i, screwLen);
		}
	}
}

if (false) { // HB Screw test
	screwLen = 30;

	translate([20, 0, 0]) {
		difference() {
			cube(16);
			translate([8, 8, -23.5]) { // Try #translate ;)
				metalScrewHB(6, screwLen, 10);
			}
		}
	}

	for (i=[2, 2.5, 3, 4, 5, 6, 8]) {
		translate([-15 * i, 0, 0]) {
			metalScrewHB(i, screwLen);
		}
	}
}

if (true) { // Hex Nut test
	
	cubeSize = 16;
	diam = 6;
	translate([20, 5, 0]) {
		difference() {
			cube(cubeSize);
			translate([cubeSize / 2, cubeSize / 2, cubeSize - getHBScrewDims(6)[0]]) { // Try #translate ;)
				hexNut(diam, top=10); 
			}
		}
	}

	translate([20, - 5 - cubeSize, 0]) {
		difference() {
			cube(cubeSize);
			translate([cubeSize / 2, cubeSize / 2, cubeSize - getHBScrewDims(6)[0]]) { // Try #translate ;)
				hull() { hexNut(diam, top=10); }
			}
		}
	}

	for (i=[2, 2.5, 3, 4, 5, 6, 8]) {
		translate([-15 * i, 0, 0]) {
			hexNut(i);
		}
	}
}

if (false) { // Washer test
	cubeSize = 16;
	diam = 6;
	translate([20, 5, 0]) {
		difference() {
			cube(cubeSize);
			translate([cubeSize / 2, cubeSize / 2, cubeSize - getWasherDims(6)[1] + 0.05]) { // Try #translate ;)
				washer(diam, top=10); 
			}
		}
	}

	translate([20, - 5 - cubeSize, 0]) {
		difference() {
			cube(cubeSize);
			translate([cubeSize / 2, cubeSize / 2, cubeSize - getWasherDims(6)[1] + 0.05]) { // Try #translate ;)
				hull() { washer(diam, top=10); }
			}
		}
	}

	for (i=[3, 3.5, 3, 4, 5, 6, 8]) {
		translate([-15 * i, 0, 0]) {
			washer(i);
		}
	}
}

// Nut bolt washer
if (false) {
	diam = 6;
	screwLen = 30;
	
	translate([- screwLen / 2, 0, 0]) {
		rotate([0, 90, 0]) {
			color("cyan") {
				metalScrewHB(diam, screwLen);
			}
			translate([0, 0, 15]) {
				color("red") {
					washer(diam);
				}
			}
			translate([0, 0, 5]) {
				color("green") {
					hexNut(diam);
				}
			}
		}
	}
}

// Ball bearing test
if (false) {
	for (i=[5, 6]) {
		translate([-20 * (i - 5), 0, 0]) {
			ballBearing(i);
		}
	}
}
